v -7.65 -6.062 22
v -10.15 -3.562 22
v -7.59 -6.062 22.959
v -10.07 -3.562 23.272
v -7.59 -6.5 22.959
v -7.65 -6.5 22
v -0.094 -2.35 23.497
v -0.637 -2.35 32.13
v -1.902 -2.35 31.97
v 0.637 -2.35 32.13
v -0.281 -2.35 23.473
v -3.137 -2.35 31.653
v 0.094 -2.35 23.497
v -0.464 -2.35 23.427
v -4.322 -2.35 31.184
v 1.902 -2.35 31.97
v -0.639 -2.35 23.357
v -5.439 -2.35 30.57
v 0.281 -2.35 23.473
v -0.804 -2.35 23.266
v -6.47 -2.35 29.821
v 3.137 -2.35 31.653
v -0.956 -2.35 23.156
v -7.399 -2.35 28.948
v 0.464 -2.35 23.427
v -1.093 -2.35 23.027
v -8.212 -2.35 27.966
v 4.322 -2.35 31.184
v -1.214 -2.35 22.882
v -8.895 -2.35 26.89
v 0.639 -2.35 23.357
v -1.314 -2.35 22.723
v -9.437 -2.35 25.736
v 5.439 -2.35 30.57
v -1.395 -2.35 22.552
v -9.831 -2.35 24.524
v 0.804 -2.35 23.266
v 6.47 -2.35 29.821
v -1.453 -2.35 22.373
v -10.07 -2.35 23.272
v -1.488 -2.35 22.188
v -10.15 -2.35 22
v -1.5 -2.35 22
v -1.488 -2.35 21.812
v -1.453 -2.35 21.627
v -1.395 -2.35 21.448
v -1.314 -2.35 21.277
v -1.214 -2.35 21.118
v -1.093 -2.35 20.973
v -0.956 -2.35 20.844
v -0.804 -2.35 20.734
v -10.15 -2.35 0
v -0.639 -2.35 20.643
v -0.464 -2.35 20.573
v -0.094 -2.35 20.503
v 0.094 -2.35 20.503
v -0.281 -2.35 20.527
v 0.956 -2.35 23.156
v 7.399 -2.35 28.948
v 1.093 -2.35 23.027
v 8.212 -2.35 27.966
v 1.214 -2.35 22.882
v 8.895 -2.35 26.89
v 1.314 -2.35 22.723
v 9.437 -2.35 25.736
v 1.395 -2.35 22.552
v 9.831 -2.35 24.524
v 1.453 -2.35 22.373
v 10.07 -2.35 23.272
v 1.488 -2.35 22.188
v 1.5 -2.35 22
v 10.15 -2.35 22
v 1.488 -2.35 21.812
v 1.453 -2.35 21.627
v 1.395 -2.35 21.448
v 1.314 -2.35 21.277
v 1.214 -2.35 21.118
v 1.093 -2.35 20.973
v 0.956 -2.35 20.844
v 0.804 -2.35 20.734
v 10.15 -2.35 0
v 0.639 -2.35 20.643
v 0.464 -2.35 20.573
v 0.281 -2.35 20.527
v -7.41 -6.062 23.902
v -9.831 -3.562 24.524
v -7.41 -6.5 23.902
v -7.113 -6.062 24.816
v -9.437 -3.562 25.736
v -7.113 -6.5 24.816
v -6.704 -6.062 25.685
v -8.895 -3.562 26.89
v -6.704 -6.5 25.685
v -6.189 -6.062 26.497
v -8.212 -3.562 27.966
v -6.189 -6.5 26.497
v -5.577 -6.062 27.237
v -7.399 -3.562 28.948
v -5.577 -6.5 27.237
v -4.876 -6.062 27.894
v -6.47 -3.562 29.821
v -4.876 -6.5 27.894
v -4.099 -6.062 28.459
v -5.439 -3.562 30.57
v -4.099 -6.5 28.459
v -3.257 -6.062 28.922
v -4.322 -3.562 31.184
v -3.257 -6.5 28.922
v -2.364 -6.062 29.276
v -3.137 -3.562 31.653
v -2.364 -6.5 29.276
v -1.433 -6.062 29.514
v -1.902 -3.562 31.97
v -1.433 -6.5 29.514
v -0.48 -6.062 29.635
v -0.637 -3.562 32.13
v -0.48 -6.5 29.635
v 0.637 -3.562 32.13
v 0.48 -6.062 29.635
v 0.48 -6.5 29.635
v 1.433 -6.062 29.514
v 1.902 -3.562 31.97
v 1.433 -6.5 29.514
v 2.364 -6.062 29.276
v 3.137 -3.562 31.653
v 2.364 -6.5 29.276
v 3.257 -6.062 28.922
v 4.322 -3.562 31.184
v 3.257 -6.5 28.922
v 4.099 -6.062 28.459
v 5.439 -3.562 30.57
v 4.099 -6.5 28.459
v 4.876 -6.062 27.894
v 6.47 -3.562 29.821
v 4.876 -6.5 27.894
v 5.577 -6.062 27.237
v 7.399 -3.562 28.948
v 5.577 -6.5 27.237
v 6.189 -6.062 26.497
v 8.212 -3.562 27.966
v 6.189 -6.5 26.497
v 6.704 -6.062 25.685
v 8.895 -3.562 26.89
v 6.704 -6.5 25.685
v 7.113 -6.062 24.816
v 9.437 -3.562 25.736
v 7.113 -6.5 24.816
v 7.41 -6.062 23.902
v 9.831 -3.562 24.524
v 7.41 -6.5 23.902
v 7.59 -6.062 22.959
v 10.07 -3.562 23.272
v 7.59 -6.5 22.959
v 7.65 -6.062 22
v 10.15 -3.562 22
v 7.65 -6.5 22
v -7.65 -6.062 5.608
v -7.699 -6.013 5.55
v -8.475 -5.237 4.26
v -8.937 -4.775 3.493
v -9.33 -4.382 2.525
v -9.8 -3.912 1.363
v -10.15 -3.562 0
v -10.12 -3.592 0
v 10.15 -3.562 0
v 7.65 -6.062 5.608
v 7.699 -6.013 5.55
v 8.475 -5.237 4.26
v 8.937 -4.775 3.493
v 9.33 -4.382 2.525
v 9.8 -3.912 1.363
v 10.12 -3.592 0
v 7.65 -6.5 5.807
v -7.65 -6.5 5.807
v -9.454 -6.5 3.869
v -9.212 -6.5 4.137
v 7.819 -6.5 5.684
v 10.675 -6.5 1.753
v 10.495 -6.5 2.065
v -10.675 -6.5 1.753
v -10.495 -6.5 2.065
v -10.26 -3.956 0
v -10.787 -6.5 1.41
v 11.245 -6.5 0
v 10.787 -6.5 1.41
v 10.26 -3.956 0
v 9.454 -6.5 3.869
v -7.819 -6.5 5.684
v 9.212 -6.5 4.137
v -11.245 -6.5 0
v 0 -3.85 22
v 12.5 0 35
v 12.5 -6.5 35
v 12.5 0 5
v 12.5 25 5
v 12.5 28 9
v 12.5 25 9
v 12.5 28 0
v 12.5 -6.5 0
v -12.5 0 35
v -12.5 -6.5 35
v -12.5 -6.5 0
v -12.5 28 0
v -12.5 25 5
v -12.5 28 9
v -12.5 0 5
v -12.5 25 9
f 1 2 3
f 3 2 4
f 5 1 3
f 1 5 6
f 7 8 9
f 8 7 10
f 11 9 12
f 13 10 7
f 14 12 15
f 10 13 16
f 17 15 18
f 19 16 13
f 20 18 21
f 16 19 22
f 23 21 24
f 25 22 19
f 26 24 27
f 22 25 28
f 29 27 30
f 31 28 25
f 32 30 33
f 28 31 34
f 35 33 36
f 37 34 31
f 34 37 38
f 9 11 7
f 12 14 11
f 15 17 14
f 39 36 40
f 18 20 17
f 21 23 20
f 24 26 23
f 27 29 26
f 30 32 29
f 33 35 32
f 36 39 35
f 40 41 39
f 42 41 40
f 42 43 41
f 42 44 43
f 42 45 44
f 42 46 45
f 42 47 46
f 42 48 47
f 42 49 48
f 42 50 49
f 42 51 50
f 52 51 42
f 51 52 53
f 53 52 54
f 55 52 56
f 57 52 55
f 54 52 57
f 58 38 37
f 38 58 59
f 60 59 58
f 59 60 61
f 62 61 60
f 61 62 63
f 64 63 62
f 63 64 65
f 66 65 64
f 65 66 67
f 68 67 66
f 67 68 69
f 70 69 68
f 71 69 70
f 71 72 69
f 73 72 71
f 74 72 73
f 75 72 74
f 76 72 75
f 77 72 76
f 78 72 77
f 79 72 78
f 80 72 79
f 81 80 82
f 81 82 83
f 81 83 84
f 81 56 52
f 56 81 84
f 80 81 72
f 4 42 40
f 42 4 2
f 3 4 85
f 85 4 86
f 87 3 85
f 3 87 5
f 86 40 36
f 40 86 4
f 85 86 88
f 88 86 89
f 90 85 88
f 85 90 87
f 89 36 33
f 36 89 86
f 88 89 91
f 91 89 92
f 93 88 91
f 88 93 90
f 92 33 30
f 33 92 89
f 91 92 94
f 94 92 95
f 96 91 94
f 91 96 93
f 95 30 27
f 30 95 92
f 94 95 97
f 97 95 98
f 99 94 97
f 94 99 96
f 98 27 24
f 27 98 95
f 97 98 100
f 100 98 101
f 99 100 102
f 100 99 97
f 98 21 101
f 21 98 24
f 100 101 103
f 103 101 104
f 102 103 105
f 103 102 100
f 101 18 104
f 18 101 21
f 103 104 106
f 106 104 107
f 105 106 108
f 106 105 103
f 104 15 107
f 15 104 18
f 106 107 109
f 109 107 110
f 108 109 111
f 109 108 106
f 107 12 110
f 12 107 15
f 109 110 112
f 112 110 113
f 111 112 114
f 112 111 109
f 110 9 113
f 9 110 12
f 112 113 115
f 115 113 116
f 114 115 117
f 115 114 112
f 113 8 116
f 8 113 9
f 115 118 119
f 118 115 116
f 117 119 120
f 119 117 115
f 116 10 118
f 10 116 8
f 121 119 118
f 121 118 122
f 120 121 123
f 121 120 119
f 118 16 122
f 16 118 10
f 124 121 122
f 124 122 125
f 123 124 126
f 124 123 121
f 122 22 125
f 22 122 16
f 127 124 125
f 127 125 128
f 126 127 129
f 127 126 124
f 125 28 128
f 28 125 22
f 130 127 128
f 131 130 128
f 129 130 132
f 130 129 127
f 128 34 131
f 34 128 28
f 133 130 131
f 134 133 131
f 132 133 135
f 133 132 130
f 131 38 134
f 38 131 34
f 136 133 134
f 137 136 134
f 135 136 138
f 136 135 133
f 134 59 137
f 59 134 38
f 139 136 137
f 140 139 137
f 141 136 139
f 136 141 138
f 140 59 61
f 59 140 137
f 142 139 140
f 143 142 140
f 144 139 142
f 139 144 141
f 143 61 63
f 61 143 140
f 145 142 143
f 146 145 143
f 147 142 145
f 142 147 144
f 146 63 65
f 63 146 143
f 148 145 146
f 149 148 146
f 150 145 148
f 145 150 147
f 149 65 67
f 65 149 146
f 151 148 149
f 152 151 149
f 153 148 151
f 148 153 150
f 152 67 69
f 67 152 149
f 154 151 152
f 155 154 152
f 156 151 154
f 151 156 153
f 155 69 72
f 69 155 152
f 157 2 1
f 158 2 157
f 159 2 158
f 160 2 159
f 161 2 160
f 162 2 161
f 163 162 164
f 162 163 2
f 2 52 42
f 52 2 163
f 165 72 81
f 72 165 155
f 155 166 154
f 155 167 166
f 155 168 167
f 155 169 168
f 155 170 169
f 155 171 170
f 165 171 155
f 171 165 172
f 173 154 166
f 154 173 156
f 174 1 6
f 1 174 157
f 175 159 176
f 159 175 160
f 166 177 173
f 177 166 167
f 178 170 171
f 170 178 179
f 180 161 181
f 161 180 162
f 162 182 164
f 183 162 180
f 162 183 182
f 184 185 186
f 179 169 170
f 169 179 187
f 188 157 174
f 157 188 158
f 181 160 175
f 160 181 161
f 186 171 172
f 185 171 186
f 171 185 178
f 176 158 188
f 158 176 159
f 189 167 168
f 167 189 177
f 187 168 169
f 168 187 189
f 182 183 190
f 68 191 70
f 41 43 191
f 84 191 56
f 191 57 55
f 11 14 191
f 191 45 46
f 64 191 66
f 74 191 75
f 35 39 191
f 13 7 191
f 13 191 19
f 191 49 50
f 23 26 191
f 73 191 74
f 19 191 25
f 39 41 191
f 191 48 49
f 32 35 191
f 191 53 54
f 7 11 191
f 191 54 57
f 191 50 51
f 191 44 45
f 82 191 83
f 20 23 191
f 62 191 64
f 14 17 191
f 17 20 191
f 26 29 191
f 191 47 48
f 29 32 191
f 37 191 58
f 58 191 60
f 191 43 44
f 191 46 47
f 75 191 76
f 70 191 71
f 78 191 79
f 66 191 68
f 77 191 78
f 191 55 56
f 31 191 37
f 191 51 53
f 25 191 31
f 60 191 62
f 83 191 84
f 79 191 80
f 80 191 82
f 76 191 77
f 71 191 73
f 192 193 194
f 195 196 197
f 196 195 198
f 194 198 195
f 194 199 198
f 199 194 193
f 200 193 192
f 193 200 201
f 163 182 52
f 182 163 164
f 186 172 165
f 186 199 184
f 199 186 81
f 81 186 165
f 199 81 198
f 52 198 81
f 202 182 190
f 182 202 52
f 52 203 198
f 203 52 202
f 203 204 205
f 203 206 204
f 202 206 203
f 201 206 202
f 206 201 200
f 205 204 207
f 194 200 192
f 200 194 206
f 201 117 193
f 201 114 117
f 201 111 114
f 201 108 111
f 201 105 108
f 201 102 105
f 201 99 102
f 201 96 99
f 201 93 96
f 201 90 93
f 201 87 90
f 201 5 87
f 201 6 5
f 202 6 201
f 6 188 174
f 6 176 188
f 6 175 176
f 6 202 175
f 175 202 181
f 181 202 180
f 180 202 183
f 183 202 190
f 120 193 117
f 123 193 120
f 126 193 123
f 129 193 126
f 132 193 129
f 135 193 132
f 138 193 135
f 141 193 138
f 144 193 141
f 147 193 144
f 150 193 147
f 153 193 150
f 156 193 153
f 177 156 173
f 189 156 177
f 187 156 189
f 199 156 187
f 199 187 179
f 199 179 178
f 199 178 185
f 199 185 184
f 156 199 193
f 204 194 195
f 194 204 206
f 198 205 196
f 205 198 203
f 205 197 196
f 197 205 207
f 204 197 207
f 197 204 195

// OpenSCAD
/*Created by Andy Levesque
Credit to @David D on Printables and Jonathan at Keep Making for Multiconnect and Multiboard, respectively
Licensed Creative Commons 4.0 Attribution Non-Commercial Sharable with Attribution
*/

/* [Standard Parameters] */
hookWidth = 25;
hookInternalDepth = 25;
hookLipHeight = 4;
hookStyle = "standard"; // ["standard", "round"]
hookQuantity = 1;

/*[Additional Customization]*/
hookLipThickness = 3;
hookBottomThickness = 5;
backHeight = 35;
hookSpacing = 20;


/*[Slot Customization]*/
//Distance between Multiconnect slots on the back (25mm is standard for MultiBoard)
distanceBetweenSlots = 25;
//QuickRelease removes the small indent in the top of the slots that lock the part into place
slotQuickRelease = false;
//Dimple scale tweaks the size of the dimple in the slot for printers that need a larger dimple to print correctly
dimpleScale = 1; //[0.5:.05:1.5]
//Scale the size of slots in the back (1.015 scale is default for a tight fit. Increase if your finding poor fit. )
slotTolerance = 1.00; //[0.925:0.005:1.075]
//Move the slot in (positive) or out (negative)
slotDepthMicroadjustment = 0; //[-.5:0.05:.5]
//enable a slot on-ramp for easy mounting of tall items
onRampEnabled = true;
//frequency of slots for on-ramp. 1 = every slot; 2 = every 2 slots; etc.
onRampEveryXSlots = 1;


/*[Hidden]*/
hookOverallWidth = hookWidth * hookQuantity + hookSpacing * (hookQuantity - 1);
backWidth = max(distanceBetweenSlots,hookOverallWidth);

//Hook
union(){
    //back
    translate(v = [-backWidth/2,0,0]) 
        multiconnectBack(backWidth = backWidth, backHeight = backHeight, distanceBetweenSlots = distanceBetweenSlots);
 
    for (i=[0:hookQuantity-1]){
        if (hookStyle == "standard") {
            translate([-backWidth/2 + i*hookSpacing + i*hookWidth + hookWidth/2,0,0]) 
                hookStandard(hookWidth, hookInternalDepth, hookLipThickness, hookBottomThickness);
        } else if (hookStyle == "round") {

            // This slices the bottom off the rounded hook so it can print cleanly
            difference(){
                translate([-backWidth/2 + i*hookSpacing + i*hookWidth + hookWidth/2,0,-1]) {
                    roundedHook(hookInternalDepth, hookWidth, hookLipHeight);
                }
                translate([-backWidth/2,0,-10]) cube(size=[backWidth, hookInternalDepth + hookWidth,10]);
            }
        }
    }
}

//BEGIN MODULES
//Standard Hook
module hookStandard(hookWidth, hookInternalDepth, hookLipThickness, hookBottomThickness) 
{
    union() {
        //hook base
        translate(v = [-hookWidth/2,0,0]) 
            cube(size = [hookWidth,hookInternalDepth+hookLipThickness,hookBottomThickness]);
        //hook lip
        translate(v = [-hookWidth/2,hookInternalDepth,0]) 
            cube(size = [hookWidth,hookLipThickness,hookLipHeight+hookBottomThickness]);
    }
}

// Single rounded hook
module roundedHook(hookInternalDepth, hookWidth, hookLipHeight) {
    // length
        translate(v = [0, hookInternalDepth, hookWidth/2])
    rotate([90,0,0]) 
    linear_extrude(hookInternalDepth) circle(hookWidth/2);

    // curve
    translate([0,hookInternalDepth,hookWidth])
    rotate([0,90,0])
    rotate_extrude(angle=90)
    translate([hookWidth/2,0,0])
    circle(hookWidth/2);
       
    //curve 
            translate([0,hookInternalDepth + hookWidth/2,hookWidth])
    cylinder(h = hookLipHeight - hookWidth/2, r = hookWidth/2);

    // hook end
    translate([0,hookInternalDepth + hookWidth/2, hookWidth/2 + hookLipHeight])
    sphere(r = hookWidth/2);

}

//Slotted back Module
module multiconnectBack(backWidth, backHeight, distanceBetweenSlots)
{
    //slot count calculates how many slots can fit on the back. Based on internal width for buffer. 
    //slot width needs to be at least the distance between slot for at least 1 slot to generate
    let (backWidth = max(backWidth,distanceBetweenSlots), backHeight = max(backHeight, 25),slotCount = floor(backWidth/distanceBetweenSlots), backThickness = 6.5){
        difference() {
            translate(v = [0,-backThickness,0]) cube(size = [backWidth,backThickness,backHeight]);
            //Loop through slots and center on the item
            //Note: I kept doing math until it looked right. It's possible this can be simplified.
            for (slotNum = [0:1:slotCount-1]) {
                translate(v = [distanceBetweenSlots/2+(backWidth/distanceBetweenSlots-slotCount)*distanceBetweenSlots/2+slotNum*distanceBetweenSlots,-2.35+slotDepthMicroadjustment,backHeight-13]) {
                    slotTool(backHeight);
                }
            }
        }
    }
    //Create Slot Tool
    module slotTool(totalHeight) {
        scale(v = slotTolerance)
        //slot minus optional dimple with optional on-ramp
        let (slotProfile = [[0,0],[10.15,0],[10.15,1.2121],[7.65,3.712],[7.65,5],[0,5]])
        difference() {
            union() {
                //round top
                rotate(a = [90,0,0,]) 
                    rotate_extrude($fn=50) 
                        polygon(points = slotProfile);
                //long slot
                translate(v = [0,0,0]) 
                    rotate(a = [180,0,0]) 
                    linear_extrude(height = totalHeight+1) 
                        union(){
                            polygon(points = slotProfile);
                            mirror([1,0,0])
                                polygon(points = slotProfile);
                        }
                //on-ramp
                if(onRampEnabled)
                    for(y = [1:onRampEveryXSlots:totalHeight/distanceBetweenSlots])
                        translate(v = [0,-5,-y*distanceBetweenSlots]) 
                            rotate(a = [-90,0,0]) 
                                cylinder(h = 5, r1 = 12, r2 = 10.15);
            }
            //dimple
            if (slotQuickRelease == false)
                scale(v = dimpleScale) 
                rotate(a = [90,0,0,]) 
                    rotate_extrude($fn=50) 
                        polygon(points = [[0,0],[0,1.5],[1.5,0]]);
        }
    }
}
